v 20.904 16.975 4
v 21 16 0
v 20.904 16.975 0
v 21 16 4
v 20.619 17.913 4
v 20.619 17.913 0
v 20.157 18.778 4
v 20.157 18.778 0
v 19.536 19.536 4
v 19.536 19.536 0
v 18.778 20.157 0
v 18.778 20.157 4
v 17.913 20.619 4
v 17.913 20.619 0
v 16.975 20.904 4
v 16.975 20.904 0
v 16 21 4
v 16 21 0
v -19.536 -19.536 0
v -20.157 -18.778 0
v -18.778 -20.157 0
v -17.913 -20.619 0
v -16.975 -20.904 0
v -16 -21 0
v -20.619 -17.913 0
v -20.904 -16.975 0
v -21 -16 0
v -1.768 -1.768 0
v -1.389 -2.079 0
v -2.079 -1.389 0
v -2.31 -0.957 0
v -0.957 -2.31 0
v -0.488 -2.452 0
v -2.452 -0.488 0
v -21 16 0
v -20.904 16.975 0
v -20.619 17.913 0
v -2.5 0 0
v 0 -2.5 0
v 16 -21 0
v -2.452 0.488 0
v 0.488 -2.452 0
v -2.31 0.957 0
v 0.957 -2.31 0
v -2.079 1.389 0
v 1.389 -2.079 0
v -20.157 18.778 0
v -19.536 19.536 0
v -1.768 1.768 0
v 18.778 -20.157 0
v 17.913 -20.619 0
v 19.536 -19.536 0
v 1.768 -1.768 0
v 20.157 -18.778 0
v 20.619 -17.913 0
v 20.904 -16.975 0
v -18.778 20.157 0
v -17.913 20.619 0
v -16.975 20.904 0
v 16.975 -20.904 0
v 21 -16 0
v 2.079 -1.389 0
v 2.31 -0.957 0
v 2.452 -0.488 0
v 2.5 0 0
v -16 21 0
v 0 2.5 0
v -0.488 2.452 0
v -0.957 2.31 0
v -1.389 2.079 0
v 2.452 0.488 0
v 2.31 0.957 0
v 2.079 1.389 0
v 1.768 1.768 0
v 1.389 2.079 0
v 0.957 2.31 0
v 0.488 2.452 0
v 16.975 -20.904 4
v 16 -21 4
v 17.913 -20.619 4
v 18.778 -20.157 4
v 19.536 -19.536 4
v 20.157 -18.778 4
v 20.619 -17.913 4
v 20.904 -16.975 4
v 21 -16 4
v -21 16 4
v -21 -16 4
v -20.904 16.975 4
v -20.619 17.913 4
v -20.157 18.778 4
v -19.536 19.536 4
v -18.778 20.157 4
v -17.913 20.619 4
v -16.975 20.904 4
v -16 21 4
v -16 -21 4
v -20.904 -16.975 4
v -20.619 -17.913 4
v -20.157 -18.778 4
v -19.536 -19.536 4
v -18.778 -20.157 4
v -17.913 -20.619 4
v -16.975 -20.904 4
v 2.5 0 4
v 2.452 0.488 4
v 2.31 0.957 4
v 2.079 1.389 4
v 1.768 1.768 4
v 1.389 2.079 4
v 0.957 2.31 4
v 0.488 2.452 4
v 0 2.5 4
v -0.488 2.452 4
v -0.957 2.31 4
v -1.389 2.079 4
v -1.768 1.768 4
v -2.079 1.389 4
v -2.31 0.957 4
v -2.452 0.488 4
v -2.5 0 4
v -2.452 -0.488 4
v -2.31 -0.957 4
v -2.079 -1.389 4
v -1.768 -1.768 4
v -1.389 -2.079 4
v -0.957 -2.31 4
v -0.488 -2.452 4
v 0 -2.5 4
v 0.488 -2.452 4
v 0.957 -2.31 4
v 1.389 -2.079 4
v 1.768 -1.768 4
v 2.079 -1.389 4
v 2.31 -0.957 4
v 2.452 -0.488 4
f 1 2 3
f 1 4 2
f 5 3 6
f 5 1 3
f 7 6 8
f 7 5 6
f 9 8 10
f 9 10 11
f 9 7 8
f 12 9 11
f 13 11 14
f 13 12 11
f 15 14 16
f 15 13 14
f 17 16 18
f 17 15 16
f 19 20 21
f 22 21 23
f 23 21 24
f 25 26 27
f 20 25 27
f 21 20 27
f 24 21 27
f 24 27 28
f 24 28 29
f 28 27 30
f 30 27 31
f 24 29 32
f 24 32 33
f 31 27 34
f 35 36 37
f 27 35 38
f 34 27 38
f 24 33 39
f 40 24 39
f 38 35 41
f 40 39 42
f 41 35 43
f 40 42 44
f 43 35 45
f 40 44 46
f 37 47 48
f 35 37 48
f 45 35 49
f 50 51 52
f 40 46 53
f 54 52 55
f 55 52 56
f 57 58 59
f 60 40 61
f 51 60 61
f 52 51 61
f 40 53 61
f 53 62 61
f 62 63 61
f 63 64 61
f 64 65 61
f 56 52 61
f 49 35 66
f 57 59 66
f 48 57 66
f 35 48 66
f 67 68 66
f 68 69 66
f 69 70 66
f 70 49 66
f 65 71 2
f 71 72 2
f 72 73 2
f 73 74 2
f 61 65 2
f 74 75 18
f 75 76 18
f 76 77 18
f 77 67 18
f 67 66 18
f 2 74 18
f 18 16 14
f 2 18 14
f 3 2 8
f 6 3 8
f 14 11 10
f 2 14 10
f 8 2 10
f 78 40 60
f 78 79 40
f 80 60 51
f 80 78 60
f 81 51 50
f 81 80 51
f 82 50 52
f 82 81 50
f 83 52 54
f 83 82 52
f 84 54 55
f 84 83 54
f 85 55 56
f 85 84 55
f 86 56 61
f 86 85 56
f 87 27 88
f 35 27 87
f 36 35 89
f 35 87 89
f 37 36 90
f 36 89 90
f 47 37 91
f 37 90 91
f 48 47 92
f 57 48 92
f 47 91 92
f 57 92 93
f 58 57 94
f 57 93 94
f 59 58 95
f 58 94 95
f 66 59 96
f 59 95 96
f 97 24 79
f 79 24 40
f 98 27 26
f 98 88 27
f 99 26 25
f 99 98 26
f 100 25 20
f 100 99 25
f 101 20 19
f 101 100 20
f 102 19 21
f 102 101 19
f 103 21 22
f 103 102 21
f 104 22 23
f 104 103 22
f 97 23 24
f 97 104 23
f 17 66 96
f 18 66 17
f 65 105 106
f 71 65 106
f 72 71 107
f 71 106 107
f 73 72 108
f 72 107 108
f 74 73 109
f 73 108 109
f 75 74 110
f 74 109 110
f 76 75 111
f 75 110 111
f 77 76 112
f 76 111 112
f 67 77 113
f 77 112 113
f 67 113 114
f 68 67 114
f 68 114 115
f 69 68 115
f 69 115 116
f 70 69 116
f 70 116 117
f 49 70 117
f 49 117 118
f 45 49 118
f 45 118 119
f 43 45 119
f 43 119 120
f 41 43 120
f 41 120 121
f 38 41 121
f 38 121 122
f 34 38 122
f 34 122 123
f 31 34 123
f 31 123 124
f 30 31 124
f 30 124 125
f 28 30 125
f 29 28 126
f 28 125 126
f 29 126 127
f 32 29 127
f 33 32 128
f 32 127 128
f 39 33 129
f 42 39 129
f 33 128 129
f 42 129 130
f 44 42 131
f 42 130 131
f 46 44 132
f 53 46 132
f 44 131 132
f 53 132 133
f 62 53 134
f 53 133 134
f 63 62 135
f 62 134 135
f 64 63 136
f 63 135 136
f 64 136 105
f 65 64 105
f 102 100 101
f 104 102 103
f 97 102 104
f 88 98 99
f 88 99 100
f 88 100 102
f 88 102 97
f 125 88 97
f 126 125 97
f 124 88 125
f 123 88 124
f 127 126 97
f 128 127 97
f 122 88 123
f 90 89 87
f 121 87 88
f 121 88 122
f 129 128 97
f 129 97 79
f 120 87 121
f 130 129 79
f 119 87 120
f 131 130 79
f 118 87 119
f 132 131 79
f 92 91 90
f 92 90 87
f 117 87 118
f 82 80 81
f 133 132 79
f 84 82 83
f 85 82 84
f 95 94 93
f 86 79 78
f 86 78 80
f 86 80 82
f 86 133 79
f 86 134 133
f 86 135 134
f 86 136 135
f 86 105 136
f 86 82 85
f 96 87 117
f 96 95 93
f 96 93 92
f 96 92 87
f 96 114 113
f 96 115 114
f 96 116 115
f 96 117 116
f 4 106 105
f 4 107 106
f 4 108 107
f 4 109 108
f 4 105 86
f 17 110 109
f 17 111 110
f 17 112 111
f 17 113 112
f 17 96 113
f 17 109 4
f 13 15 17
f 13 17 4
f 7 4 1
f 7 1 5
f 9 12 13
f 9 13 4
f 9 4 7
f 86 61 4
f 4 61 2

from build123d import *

# Parameters (mm, degrees)
F0_W     = 42
F0_H     = 42
F1_DEPTH = 4
F3_R     = 5
F4_R     = 2.5
F5_DEPTH = 25


with BuildPart() as f1:
    # F0 (on Top) → F1 (new body)
    with BuildSketch(Plane.XY):
        Rectangle(F0_W, F0_H)
    extrude(amount=F1_DEPTH)

    # F3
    f3_edges = [f1.edges().sort_by_distance(p)[0] for p in [
        (-21, 21, 2),
        (-21, -21, 2),
        (21, -21, 2),
        (21, 21, 2),
    ]]
    fillet(f3_edges, radius=F3_R)

    # F4 (on face) → F5 (cut)
    with BuildSketch(Plane.XY.offset(4)):
        Circle(F4_R)
    extrude(amount=-F5_DEPTH, mode=Mode.SUBTRACT)


solid = f1.part
